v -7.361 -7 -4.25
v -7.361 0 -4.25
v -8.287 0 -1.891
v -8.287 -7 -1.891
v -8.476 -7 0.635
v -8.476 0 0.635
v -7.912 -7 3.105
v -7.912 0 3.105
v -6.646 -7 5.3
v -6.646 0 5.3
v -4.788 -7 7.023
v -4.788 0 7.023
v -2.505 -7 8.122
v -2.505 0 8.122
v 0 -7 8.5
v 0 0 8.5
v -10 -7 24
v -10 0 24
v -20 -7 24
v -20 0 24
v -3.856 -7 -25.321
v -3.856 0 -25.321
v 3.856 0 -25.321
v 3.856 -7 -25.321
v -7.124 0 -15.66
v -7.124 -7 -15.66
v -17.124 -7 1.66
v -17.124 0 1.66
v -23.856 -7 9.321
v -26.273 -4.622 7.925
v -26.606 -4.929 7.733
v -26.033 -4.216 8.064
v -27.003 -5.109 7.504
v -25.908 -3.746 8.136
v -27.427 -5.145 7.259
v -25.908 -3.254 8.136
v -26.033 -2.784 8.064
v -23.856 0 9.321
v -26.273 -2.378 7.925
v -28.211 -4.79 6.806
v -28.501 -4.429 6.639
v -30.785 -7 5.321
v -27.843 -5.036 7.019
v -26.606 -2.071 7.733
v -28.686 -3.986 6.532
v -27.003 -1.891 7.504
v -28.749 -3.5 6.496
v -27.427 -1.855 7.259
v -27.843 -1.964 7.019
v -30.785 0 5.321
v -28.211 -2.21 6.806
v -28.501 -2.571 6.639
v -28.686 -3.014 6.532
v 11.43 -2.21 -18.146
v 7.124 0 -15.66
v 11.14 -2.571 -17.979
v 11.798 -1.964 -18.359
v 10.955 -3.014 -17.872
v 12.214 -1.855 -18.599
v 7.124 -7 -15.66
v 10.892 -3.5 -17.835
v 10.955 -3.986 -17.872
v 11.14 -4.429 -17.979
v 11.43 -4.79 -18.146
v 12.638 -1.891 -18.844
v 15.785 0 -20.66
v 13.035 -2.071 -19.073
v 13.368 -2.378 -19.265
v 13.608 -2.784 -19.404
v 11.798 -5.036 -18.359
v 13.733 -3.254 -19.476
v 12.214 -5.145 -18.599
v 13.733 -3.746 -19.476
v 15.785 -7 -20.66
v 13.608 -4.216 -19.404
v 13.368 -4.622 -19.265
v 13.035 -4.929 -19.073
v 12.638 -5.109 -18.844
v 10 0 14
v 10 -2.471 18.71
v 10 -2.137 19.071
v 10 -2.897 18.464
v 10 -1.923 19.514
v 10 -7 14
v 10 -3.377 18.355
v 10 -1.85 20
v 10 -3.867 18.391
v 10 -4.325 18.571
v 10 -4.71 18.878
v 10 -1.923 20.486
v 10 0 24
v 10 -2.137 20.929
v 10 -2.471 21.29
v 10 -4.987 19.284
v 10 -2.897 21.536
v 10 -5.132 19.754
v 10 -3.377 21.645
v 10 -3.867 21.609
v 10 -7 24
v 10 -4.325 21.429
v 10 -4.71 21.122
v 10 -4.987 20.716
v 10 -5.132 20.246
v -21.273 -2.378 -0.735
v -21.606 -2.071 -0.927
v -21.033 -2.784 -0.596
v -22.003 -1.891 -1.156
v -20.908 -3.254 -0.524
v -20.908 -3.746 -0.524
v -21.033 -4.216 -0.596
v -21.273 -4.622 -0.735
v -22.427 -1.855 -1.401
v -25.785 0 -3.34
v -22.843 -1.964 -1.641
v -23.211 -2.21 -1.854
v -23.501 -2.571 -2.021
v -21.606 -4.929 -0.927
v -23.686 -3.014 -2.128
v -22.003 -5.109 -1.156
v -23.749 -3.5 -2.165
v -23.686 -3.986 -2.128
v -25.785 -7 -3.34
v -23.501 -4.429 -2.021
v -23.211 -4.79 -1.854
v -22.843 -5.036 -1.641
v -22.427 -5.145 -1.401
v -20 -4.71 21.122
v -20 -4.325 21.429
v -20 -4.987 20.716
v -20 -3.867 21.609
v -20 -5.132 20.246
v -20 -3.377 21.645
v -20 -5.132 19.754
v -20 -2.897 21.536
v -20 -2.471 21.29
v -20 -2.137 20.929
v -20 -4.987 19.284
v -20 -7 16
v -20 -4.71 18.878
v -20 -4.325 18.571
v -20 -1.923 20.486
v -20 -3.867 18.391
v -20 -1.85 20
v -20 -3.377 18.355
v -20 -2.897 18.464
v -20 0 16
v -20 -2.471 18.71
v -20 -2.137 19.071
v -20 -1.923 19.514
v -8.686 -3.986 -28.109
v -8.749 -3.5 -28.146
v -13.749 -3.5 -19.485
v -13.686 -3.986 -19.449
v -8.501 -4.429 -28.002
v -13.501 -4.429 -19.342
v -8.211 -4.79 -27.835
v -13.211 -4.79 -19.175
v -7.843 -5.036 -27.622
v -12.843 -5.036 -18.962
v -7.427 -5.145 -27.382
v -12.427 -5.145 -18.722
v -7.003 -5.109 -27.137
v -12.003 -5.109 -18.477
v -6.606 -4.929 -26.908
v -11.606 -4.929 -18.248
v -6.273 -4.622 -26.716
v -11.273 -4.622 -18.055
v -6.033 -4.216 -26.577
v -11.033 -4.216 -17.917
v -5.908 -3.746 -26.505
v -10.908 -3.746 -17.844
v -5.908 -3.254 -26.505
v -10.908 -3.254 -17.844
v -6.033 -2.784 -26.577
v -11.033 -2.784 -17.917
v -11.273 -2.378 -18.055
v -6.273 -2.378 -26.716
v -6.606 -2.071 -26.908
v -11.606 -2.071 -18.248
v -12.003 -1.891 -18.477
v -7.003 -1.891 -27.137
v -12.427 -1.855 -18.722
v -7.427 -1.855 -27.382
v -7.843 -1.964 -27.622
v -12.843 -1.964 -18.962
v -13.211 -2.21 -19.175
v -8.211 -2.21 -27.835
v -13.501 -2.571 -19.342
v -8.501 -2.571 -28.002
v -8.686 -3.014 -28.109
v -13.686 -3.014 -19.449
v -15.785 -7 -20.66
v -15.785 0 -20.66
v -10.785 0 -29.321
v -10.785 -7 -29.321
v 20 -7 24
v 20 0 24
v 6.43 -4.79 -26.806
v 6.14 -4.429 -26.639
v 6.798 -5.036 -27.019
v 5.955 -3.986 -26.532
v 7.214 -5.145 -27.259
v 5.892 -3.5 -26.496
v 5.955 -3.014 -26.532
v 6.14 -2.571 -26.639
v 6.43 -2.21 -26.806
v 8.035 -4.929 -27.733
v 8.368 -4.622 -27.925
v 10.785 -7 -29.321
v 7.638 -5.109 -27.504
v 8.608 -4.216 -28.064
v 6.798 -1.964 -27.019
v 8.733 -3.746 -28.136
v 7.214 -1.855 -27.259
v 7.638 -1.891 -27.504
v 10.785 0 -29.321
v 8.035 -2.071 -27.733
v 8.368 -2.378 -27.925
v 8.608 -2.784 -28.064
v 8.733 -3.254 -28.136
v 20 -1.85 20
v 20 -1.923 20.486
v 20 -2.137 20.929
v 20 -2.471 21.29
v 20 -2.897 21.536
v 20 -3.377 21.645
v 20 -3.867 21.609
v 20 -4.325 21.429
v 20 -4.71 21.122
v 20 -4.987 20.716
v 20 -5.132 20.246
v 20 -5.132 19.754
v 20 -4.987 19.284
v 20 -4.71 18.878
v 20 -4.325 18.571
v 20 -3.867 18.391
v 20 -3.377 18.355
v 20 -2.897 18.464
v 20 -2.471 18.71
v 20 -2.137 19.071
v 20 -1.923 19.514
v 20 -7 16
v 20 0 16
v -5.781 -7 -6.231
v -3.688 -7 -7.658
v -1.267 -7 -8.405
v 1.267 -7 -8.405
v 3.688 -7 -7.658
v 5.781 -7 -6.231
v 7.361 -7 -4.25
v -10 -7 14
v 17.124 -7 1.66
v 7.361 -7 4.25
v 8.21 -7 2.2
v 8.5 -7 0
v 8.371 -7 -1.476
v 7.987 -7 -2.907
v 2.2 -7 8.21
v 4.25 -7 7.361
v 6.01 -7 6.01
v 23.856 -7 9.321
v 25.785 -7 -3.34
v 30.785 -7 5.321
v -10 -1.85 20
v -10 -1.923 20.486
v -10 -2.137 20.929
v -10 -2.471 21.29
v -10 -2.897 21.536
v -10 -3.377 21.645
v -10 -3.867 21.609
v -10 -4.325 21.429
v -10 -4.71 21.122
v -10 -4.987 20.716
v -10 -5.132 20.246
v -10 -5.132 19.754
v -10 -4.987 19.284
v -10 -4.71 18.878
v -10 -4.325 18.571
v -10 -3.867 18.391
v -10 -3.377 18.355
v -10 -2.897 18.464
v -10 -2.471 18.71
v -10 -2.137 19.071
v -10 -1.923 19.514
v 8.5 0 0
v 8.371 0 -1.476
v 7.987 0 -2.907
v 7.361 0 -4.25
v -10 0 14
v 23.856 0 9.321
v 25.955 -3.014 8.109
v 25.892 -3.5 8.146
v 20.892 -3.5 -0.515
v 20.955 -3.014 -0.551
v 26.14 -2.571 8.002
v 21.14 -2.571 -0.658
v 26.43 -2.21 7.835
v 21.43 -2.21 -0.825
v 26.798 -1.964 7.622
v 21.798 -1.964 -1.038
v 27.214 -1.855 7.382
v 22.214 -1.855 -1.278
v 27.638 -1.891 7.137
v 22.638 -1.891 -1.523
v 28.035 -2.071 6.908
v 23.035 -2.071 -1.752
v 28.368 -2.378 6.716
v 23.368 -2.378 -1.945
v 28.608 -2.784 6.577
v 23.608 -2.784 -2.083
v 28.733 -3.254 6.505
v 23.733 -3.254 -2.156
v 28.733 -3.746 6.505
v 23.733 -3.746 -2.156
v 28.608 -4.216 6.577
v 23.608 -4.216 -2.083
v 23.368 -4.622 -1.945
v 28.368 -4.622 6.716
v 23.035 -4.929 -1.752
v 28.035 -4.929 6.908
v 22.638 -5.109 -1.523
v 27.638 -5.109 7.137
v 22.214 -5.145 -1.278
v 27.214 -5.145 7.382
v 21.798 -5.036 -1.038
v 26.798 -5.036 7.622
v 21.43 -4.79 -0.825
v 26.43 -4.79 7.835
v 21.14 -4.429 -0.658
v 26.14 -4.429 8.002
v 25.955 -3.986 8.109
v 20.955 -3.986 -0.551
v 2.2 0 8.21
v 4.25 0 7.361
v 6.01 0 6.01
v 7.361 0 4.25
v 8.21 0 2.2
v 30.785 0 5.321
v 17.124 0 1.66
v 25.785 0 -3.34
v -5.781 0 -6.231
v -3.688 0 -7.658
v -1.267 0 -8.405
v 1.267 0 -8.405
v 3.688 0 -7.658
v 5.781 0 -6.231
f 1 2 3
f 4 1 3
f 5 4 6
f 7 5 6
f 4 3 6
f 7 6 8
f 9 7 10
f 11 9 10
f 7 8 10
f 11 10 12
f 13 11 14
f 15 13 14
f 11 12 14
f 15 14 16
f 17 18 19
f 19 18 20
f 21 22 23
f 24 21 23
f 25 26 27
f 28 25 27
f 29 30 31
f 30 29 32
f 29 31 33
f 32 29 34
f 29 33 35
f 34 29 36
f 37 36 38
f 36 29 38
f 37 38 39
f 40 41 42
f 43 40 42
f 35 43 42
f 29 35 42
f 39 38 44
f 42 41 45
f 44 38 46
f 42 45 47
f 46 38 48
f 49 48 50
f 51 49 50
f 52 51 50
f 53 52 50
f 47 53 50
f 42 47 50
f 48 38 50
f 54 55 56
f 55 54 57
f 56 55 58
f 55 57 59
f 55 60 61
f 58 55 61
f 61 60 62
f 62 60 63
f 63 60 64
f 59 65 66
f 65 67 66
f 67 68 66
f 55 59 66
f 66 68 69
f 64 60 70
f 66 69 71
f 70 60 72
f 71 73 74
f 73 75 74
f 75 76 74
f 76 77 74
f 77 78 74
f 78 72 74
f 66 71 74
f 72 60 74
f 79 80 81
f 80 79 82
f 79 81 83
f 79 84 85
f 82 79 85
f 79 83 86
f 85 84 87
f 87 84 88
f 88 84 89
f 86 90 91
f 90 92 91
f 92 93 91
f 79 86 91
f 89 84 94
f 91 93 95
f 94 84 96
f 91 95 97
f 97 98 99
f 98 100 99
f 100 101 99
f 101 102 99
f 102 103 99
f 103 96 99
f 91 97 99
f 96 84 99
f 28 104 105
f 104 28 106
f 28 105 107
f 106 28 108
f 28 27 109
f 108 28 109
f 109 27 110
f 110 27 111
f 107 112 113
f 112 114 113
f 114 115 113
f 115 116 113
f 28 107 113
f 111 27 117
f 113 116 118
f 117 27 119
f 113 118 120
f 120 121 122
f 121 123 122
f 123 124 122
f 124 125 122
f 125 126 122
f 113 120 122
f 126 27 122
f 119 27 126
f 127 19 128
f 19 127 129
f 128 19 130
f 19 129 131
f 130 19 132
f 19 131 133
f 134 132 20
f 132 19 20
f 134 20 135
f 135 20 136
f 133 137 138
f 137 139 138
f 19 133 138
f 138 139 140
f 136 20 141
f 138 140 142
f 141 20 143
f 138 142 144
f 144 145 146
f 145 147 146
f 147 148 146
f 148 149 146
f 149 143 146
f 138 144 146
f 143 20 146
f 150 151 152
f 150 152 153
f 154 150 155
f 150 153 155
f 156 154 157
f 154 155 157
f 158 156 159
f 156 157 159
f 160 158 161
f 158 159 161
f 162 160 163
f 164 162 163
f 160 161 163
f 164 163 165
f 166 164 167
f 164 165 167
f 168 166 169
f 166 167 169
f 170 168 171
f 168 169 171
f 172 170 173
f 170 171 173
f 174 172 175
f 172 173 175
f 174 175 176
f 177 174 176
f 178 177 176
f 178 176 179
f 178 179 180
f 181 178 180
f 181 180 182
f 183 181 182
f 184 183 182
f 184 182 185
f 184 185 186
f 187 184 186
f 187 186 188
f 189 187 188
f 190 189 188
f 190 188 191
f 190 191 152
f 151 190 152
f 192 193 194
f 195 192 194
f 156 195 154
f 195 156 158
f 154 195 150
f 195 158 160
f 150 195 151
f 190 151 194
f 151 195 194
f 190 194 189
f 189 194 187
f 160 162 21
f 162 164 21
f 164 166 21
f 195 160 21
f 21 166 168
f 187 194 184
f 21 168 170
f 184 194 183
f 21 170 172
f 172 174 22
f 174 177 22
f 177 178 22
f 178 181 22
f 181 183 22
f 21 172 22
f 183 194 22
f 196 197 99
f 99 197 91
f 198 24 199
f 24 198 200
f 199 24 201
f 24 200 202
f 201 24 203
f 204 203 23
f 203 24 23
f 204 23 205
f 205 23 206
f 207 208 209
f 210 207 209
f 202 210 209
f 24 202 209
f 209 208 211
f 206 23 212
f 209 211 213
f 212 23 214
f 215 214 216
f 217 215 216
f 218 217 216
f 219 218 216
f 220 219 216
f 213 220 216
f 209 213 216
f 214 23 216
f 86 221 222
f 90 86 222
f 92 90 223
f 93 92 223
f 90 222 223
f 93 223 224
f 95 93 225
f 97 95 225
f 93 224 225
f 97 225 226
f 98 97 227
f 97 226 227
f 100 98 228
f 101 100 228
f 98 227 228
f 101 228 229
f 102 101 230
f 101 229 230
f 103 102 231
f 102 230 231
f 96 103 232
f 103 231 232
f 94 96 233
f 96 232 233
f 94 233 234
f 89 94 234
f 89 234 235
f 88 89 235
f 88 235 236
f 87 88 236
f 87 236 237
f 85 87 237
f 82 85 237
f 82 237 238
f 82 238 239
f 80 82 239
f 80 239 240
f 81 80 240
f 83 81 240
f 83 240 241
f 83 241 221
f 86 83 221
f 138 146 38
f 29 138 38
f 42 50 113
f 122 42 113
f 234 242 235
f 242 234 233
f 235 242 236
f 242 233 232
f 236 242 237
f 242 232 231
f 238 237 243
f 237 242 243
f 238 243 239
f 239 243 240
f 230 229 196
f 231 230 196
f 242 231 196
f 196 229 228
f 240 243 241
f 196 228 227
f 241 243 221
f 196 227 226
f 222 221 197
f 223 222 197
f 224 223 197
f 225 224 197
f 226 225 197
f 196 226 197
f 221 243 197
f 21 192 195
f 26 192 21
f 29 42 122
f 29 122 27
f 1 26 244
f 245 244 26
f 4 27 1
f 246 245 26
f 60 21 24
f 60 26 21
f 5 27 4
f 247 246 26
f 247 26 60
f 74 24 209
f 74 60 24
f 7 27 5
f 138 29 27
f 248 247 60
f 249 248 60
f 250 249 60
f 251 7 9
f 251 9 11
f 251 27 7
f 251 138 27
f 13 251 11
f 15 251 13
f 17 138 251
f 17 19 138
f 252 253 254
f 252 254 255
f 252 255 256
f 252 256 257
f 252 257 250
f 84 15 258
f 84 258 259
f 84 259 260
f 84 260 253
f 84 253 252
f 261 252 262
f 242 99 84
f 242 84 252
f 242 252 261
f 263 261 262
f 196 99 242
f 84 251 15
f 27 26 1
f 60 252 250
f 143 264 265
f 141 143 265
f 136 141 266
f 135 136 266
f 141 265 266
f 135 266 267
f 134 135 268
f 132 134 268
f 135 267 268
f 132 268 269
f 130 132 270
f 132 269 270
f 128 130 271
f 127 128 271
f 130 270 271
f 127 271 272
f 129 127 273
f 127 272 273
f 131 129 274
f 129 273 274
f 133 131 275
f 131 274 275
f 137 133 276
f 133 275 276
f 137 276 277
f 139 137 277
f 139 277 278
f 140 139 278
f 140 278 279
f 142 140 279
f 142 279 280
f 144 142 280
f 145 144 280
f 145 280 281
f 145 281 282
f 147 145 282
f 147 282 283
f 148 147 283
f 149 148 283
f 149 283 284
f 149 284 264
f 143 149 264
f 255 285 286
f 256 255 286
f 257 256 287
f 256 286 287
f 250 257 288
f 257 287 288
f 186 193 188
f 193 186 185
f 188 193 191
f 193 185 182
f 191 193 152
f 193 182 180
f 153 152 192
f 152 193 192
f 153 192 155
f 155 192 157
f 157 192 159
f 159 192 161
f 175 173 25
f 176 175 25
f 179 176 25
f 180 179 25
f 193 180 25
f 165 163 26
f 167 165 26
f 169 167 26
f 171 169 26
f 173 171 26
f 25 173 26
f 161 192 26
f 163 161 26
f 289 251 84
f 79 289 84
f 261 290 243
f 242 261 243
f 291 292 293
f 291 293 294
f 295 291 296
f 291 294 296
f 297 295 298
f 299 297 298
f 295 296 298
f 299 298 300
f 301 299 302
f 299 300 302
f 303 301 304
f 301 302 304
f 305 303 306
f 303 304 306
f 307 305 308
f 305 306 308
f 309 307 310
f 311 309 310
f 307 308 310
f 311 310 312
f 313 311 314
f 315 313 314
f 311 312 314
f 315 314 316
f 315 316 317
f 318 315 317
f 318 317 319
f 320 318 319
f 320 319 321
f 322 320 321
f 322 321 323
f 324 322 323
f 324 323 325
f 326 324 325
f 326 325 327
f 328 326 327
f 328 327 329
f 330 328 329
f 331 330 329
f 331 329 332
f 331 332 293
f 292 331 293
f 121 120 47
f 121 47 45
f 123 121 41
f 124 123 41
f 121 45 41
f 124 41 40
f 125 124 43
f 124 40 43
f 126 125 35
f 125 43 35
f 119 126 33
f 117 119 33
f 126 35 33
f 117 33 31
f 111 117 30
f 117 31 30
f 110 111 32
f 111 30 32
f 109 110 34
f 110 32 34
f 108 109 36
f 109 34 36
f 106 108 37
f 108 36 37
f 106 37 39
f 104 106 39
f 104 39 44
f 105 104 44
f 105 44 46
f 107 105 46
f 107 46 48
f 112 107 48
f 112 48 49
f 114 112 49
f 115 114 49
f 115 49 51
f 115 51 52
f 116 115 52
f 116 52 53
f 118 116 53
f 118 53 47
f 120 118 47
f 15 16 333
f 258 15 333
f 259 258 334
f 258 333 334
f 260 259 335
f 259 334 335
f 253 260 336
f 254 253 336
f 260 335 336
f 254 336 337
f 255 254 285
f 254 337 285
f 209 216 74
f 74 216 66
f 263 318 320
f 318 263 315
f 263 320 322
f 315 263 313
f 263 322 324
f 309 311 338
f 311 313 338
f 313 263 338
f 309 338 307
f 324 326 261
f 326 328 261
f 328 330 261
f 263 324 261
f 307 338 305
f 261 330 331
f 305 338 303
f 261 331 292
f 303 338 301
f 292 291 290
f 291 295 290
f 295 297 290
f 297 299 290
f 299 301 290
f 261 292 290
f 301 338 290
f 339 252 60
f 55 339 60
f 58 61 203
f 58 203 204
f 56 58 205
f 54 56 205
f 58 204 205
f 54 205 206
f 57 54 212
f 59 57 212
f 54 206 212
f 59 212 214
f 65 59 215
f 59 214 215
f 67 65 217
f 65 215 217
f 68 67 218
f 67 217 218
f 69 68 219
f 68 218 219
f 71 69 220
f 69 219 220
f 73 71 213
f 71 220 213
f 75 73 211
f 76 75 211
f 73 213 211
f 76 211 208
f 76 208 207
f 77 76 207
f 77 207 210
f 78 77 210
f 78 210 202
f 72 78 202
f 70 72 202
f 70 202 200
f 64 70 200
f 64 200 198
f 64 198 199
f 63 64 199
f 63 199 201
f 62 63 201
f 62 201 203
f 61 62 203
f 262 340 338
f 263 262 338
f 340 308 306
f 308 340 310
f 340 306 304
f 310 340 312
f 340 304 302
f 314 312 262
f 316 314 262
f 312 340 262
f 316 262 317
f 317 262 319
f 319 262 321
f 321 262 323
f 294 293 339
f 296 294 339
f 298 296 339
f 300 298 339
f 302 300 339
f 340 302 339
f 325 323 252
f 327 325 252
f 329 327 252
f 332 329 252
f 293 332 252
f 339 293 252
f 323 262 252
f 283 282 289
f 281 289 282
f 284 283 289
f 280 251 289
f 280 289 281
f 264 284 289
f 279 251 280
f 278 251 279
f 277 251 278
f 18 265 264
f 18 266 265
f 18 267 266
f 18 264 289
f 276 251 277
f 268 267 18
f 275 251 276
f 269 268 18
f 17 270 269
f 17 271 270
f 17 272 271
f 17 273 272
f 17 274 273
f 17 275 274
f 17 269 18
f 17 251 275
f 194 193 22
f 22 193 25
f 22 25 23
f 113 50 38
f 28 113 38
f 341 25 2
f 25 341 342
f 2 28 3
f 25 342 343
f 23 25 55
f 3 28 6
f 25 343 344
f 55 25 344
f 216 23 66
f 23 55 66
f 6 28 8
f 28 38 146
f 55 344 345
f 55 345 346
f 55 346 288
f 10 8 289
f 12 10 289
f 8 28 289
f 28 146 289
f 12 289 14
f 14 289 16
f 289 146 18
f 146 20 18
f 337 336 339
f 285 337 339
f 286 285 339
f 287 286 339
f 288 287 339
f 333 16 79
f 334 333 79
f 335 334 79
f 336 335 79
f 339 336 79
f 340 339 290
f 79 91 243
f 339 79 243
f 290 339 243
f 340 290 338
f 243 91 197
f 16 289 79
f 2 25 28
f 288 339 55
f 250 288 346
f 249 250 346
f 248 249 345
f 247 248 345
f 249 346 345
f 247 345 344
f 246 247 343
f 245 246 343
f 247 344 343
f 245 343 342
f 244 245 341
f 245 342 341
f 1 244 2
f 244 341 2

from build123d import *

# Parameters (mm, degrees)
F1_DEPTH = 7
F2_W     = 20
F2_H     = 10
F3_DEPTH = 7.001
F5_DEPTH = 7.001
F7_DEPTH = 7.001
F9_D     = 3.3
F11_D    = 3.3
F13_D    = 3.3


with BuildPart() as f1:
    # F0 (on Front) → F1 (new body)
    with BuildSketch(Plane.XZ):
        with BuildLine():
            ThreePointArc((-7.3612159322, -4.25), (-7.3612159322, 4.25), (0, 8.5))
            Line((0, 8.5), (0, 16))
            ThreePointArc((0, 16), (-13.8564064606, 8), (-13.8564064606, -8))
            Line((-13.8564064606, -8), (-7.3612159322, -4.25))
        make_face()
        Polygon((-20, 16), (0, 16), (20, 16), (20, 24), (-20, 24), align=None)
        with BuildLine():
            ThreePointArc((-13.8564064606, -8), (-13.8564064606, 8), (0, 16))
            Line((0, 16), (-20, 16))
            Line((-20, 16), (-23.8564064606, 9.3205080757))
            Line((-23.8564064606, 9.3205080757), (-13.8564064606, -8))
        make_face()
        Polygon((-3.8564064606, -25.3205080757), (-13.8564064606, -8), (-23.8564064606, 9.3205080757), (-30.7846096908, 5.3205080757), (-10.7846096908, -29.3205080757), align=None)
        with BuildLine():
            Line((13.8564064606, -8), (7.3612159322, -4.25))
            ThreePointArc((7.3612159322, -4.25), (0, -8.5), (-7.3612159322, -4.25))
            Line((-7.3612159322, -4.25), (-13.8564064606, -8))
            ThreePointArc((-13.8564064606, -8), (0, -16), (13.8564064606, -8))
        make_face()
        with BuildLine():
            Line((3.8564064606, -25.3205080757), (13.8564064606, -8))
            ThreePointArc((13.8564064606, -8), (0, -16), (-13.8564064606, -8))
            Line((-13.8564064606, -8), (-3.8564064606, -25.3205080757))
            Line((-3.8564064606, -25.3205080757), (3.8564064606, -25.3205080757))
        make_face()
        Polygon((23.8564064606, 9.3205080757), (13.8564064606, -8), (3.8564064606, -25.3205080757), (10.7846096908, -29.3205080757), (30.7846096908, 5.3205080757), align=None)
        with BuildLine():
            ThreePointArc((0, 8.5), (6.0104076401, 6.0104076401), (8.5, 0))
            ThreePointArc((8.5, 0), (8.2103695235, -2.1999618834), (7.3612159322, -4.25))
            Line((7.3612159322, -4.25), (13.8564064606, -8))
            ThreePointArc((13.8564064606, -8), (15.4548132206, -4.1411047216), (16, 0))
            ThreePointArc((16, 0), (11.313708499, 11.313708499), (0, 16))
            Line((0, 16), (0, 8.5))
        make_face()
        with BuildLine():
            Line((20, 16), (0, 16))
            ThreePointArc((0, 16), (11.313708499, 11.313708499), (16, 0))
            ThreePointArc((16, 0), (15.4548132206, -4.1411047216), (13.8564064606, -8))
            Line((13.8564064606, -8), (23.8564064606, 9.3205080757))
            Line((23.8564064606, 9.3205080757), (20, 16))
        make_face()
    extrude(amount=F1_DEPTH)

    # F2 (on face) → F3 (cut, through all)
    with BuildSketch(Plane.XZ.offset(7)):
        with Locations((0, 19)):
            Rectangle(F2_W, F2_H)
    extrude(amount=-F3_DEPTH, mode=Mode.SUBTRACT)

    # F4 (on face) → F5 (cut, through all)
    with BuildSketch(Plane.XZ.offset(7)):
        Polygon((7.124355653, -15.6602540378), (15.7846096908, -20.6602540378), (25.7846096908, -3.3397459622), (17.124355653, 1.6602540378), align=None)
    extrude(amount=-F5_DEPTH, mode=Mode.SUBTRACT)

    # F6 (on face) → F7 (cut, through all)
    with BuildSketch(Plane.XZ.offset(7)):
        Polygon((-15.7846096908, -20.6602540378), (-7.124355653, -15.6602540378), (-17.124355653, 1.6602540378), (-25.7846096908, -3.3397459622), align=None)
    extrude(amount=-F7_DEPTH, mode=Mode.SUBTRACT)

    # F9 (through all)
    with Locations(Plane(origin=(-20, 0, 0), x_dir=(0, -1, 0), z_dir=(-1, 0, 0))):
        with Locations((3.5, 20)):
            Hole(F9_D / 2)

    # F11 (through all)
    with Locations(Plane(origin=(10, 0, 17.3205080757), x_dir=(0.8660254038, 0, -0.5), z_dir=(0.5, 0, 0.8660254038))):
        with Locations((20, -3.5)):
            Hole(F11_D / 2)

    # F13 (through all)
    with Locations(Plane(origin=(10, 0, -17.3205080757), x_dir=(0.8660254038, 0, 0.5), z_dir=(0.5, 0, -0.8660254038))):
        with Locations((-20, 3.5)):
            Hole(F13_D / 2)


solid = f1.part
